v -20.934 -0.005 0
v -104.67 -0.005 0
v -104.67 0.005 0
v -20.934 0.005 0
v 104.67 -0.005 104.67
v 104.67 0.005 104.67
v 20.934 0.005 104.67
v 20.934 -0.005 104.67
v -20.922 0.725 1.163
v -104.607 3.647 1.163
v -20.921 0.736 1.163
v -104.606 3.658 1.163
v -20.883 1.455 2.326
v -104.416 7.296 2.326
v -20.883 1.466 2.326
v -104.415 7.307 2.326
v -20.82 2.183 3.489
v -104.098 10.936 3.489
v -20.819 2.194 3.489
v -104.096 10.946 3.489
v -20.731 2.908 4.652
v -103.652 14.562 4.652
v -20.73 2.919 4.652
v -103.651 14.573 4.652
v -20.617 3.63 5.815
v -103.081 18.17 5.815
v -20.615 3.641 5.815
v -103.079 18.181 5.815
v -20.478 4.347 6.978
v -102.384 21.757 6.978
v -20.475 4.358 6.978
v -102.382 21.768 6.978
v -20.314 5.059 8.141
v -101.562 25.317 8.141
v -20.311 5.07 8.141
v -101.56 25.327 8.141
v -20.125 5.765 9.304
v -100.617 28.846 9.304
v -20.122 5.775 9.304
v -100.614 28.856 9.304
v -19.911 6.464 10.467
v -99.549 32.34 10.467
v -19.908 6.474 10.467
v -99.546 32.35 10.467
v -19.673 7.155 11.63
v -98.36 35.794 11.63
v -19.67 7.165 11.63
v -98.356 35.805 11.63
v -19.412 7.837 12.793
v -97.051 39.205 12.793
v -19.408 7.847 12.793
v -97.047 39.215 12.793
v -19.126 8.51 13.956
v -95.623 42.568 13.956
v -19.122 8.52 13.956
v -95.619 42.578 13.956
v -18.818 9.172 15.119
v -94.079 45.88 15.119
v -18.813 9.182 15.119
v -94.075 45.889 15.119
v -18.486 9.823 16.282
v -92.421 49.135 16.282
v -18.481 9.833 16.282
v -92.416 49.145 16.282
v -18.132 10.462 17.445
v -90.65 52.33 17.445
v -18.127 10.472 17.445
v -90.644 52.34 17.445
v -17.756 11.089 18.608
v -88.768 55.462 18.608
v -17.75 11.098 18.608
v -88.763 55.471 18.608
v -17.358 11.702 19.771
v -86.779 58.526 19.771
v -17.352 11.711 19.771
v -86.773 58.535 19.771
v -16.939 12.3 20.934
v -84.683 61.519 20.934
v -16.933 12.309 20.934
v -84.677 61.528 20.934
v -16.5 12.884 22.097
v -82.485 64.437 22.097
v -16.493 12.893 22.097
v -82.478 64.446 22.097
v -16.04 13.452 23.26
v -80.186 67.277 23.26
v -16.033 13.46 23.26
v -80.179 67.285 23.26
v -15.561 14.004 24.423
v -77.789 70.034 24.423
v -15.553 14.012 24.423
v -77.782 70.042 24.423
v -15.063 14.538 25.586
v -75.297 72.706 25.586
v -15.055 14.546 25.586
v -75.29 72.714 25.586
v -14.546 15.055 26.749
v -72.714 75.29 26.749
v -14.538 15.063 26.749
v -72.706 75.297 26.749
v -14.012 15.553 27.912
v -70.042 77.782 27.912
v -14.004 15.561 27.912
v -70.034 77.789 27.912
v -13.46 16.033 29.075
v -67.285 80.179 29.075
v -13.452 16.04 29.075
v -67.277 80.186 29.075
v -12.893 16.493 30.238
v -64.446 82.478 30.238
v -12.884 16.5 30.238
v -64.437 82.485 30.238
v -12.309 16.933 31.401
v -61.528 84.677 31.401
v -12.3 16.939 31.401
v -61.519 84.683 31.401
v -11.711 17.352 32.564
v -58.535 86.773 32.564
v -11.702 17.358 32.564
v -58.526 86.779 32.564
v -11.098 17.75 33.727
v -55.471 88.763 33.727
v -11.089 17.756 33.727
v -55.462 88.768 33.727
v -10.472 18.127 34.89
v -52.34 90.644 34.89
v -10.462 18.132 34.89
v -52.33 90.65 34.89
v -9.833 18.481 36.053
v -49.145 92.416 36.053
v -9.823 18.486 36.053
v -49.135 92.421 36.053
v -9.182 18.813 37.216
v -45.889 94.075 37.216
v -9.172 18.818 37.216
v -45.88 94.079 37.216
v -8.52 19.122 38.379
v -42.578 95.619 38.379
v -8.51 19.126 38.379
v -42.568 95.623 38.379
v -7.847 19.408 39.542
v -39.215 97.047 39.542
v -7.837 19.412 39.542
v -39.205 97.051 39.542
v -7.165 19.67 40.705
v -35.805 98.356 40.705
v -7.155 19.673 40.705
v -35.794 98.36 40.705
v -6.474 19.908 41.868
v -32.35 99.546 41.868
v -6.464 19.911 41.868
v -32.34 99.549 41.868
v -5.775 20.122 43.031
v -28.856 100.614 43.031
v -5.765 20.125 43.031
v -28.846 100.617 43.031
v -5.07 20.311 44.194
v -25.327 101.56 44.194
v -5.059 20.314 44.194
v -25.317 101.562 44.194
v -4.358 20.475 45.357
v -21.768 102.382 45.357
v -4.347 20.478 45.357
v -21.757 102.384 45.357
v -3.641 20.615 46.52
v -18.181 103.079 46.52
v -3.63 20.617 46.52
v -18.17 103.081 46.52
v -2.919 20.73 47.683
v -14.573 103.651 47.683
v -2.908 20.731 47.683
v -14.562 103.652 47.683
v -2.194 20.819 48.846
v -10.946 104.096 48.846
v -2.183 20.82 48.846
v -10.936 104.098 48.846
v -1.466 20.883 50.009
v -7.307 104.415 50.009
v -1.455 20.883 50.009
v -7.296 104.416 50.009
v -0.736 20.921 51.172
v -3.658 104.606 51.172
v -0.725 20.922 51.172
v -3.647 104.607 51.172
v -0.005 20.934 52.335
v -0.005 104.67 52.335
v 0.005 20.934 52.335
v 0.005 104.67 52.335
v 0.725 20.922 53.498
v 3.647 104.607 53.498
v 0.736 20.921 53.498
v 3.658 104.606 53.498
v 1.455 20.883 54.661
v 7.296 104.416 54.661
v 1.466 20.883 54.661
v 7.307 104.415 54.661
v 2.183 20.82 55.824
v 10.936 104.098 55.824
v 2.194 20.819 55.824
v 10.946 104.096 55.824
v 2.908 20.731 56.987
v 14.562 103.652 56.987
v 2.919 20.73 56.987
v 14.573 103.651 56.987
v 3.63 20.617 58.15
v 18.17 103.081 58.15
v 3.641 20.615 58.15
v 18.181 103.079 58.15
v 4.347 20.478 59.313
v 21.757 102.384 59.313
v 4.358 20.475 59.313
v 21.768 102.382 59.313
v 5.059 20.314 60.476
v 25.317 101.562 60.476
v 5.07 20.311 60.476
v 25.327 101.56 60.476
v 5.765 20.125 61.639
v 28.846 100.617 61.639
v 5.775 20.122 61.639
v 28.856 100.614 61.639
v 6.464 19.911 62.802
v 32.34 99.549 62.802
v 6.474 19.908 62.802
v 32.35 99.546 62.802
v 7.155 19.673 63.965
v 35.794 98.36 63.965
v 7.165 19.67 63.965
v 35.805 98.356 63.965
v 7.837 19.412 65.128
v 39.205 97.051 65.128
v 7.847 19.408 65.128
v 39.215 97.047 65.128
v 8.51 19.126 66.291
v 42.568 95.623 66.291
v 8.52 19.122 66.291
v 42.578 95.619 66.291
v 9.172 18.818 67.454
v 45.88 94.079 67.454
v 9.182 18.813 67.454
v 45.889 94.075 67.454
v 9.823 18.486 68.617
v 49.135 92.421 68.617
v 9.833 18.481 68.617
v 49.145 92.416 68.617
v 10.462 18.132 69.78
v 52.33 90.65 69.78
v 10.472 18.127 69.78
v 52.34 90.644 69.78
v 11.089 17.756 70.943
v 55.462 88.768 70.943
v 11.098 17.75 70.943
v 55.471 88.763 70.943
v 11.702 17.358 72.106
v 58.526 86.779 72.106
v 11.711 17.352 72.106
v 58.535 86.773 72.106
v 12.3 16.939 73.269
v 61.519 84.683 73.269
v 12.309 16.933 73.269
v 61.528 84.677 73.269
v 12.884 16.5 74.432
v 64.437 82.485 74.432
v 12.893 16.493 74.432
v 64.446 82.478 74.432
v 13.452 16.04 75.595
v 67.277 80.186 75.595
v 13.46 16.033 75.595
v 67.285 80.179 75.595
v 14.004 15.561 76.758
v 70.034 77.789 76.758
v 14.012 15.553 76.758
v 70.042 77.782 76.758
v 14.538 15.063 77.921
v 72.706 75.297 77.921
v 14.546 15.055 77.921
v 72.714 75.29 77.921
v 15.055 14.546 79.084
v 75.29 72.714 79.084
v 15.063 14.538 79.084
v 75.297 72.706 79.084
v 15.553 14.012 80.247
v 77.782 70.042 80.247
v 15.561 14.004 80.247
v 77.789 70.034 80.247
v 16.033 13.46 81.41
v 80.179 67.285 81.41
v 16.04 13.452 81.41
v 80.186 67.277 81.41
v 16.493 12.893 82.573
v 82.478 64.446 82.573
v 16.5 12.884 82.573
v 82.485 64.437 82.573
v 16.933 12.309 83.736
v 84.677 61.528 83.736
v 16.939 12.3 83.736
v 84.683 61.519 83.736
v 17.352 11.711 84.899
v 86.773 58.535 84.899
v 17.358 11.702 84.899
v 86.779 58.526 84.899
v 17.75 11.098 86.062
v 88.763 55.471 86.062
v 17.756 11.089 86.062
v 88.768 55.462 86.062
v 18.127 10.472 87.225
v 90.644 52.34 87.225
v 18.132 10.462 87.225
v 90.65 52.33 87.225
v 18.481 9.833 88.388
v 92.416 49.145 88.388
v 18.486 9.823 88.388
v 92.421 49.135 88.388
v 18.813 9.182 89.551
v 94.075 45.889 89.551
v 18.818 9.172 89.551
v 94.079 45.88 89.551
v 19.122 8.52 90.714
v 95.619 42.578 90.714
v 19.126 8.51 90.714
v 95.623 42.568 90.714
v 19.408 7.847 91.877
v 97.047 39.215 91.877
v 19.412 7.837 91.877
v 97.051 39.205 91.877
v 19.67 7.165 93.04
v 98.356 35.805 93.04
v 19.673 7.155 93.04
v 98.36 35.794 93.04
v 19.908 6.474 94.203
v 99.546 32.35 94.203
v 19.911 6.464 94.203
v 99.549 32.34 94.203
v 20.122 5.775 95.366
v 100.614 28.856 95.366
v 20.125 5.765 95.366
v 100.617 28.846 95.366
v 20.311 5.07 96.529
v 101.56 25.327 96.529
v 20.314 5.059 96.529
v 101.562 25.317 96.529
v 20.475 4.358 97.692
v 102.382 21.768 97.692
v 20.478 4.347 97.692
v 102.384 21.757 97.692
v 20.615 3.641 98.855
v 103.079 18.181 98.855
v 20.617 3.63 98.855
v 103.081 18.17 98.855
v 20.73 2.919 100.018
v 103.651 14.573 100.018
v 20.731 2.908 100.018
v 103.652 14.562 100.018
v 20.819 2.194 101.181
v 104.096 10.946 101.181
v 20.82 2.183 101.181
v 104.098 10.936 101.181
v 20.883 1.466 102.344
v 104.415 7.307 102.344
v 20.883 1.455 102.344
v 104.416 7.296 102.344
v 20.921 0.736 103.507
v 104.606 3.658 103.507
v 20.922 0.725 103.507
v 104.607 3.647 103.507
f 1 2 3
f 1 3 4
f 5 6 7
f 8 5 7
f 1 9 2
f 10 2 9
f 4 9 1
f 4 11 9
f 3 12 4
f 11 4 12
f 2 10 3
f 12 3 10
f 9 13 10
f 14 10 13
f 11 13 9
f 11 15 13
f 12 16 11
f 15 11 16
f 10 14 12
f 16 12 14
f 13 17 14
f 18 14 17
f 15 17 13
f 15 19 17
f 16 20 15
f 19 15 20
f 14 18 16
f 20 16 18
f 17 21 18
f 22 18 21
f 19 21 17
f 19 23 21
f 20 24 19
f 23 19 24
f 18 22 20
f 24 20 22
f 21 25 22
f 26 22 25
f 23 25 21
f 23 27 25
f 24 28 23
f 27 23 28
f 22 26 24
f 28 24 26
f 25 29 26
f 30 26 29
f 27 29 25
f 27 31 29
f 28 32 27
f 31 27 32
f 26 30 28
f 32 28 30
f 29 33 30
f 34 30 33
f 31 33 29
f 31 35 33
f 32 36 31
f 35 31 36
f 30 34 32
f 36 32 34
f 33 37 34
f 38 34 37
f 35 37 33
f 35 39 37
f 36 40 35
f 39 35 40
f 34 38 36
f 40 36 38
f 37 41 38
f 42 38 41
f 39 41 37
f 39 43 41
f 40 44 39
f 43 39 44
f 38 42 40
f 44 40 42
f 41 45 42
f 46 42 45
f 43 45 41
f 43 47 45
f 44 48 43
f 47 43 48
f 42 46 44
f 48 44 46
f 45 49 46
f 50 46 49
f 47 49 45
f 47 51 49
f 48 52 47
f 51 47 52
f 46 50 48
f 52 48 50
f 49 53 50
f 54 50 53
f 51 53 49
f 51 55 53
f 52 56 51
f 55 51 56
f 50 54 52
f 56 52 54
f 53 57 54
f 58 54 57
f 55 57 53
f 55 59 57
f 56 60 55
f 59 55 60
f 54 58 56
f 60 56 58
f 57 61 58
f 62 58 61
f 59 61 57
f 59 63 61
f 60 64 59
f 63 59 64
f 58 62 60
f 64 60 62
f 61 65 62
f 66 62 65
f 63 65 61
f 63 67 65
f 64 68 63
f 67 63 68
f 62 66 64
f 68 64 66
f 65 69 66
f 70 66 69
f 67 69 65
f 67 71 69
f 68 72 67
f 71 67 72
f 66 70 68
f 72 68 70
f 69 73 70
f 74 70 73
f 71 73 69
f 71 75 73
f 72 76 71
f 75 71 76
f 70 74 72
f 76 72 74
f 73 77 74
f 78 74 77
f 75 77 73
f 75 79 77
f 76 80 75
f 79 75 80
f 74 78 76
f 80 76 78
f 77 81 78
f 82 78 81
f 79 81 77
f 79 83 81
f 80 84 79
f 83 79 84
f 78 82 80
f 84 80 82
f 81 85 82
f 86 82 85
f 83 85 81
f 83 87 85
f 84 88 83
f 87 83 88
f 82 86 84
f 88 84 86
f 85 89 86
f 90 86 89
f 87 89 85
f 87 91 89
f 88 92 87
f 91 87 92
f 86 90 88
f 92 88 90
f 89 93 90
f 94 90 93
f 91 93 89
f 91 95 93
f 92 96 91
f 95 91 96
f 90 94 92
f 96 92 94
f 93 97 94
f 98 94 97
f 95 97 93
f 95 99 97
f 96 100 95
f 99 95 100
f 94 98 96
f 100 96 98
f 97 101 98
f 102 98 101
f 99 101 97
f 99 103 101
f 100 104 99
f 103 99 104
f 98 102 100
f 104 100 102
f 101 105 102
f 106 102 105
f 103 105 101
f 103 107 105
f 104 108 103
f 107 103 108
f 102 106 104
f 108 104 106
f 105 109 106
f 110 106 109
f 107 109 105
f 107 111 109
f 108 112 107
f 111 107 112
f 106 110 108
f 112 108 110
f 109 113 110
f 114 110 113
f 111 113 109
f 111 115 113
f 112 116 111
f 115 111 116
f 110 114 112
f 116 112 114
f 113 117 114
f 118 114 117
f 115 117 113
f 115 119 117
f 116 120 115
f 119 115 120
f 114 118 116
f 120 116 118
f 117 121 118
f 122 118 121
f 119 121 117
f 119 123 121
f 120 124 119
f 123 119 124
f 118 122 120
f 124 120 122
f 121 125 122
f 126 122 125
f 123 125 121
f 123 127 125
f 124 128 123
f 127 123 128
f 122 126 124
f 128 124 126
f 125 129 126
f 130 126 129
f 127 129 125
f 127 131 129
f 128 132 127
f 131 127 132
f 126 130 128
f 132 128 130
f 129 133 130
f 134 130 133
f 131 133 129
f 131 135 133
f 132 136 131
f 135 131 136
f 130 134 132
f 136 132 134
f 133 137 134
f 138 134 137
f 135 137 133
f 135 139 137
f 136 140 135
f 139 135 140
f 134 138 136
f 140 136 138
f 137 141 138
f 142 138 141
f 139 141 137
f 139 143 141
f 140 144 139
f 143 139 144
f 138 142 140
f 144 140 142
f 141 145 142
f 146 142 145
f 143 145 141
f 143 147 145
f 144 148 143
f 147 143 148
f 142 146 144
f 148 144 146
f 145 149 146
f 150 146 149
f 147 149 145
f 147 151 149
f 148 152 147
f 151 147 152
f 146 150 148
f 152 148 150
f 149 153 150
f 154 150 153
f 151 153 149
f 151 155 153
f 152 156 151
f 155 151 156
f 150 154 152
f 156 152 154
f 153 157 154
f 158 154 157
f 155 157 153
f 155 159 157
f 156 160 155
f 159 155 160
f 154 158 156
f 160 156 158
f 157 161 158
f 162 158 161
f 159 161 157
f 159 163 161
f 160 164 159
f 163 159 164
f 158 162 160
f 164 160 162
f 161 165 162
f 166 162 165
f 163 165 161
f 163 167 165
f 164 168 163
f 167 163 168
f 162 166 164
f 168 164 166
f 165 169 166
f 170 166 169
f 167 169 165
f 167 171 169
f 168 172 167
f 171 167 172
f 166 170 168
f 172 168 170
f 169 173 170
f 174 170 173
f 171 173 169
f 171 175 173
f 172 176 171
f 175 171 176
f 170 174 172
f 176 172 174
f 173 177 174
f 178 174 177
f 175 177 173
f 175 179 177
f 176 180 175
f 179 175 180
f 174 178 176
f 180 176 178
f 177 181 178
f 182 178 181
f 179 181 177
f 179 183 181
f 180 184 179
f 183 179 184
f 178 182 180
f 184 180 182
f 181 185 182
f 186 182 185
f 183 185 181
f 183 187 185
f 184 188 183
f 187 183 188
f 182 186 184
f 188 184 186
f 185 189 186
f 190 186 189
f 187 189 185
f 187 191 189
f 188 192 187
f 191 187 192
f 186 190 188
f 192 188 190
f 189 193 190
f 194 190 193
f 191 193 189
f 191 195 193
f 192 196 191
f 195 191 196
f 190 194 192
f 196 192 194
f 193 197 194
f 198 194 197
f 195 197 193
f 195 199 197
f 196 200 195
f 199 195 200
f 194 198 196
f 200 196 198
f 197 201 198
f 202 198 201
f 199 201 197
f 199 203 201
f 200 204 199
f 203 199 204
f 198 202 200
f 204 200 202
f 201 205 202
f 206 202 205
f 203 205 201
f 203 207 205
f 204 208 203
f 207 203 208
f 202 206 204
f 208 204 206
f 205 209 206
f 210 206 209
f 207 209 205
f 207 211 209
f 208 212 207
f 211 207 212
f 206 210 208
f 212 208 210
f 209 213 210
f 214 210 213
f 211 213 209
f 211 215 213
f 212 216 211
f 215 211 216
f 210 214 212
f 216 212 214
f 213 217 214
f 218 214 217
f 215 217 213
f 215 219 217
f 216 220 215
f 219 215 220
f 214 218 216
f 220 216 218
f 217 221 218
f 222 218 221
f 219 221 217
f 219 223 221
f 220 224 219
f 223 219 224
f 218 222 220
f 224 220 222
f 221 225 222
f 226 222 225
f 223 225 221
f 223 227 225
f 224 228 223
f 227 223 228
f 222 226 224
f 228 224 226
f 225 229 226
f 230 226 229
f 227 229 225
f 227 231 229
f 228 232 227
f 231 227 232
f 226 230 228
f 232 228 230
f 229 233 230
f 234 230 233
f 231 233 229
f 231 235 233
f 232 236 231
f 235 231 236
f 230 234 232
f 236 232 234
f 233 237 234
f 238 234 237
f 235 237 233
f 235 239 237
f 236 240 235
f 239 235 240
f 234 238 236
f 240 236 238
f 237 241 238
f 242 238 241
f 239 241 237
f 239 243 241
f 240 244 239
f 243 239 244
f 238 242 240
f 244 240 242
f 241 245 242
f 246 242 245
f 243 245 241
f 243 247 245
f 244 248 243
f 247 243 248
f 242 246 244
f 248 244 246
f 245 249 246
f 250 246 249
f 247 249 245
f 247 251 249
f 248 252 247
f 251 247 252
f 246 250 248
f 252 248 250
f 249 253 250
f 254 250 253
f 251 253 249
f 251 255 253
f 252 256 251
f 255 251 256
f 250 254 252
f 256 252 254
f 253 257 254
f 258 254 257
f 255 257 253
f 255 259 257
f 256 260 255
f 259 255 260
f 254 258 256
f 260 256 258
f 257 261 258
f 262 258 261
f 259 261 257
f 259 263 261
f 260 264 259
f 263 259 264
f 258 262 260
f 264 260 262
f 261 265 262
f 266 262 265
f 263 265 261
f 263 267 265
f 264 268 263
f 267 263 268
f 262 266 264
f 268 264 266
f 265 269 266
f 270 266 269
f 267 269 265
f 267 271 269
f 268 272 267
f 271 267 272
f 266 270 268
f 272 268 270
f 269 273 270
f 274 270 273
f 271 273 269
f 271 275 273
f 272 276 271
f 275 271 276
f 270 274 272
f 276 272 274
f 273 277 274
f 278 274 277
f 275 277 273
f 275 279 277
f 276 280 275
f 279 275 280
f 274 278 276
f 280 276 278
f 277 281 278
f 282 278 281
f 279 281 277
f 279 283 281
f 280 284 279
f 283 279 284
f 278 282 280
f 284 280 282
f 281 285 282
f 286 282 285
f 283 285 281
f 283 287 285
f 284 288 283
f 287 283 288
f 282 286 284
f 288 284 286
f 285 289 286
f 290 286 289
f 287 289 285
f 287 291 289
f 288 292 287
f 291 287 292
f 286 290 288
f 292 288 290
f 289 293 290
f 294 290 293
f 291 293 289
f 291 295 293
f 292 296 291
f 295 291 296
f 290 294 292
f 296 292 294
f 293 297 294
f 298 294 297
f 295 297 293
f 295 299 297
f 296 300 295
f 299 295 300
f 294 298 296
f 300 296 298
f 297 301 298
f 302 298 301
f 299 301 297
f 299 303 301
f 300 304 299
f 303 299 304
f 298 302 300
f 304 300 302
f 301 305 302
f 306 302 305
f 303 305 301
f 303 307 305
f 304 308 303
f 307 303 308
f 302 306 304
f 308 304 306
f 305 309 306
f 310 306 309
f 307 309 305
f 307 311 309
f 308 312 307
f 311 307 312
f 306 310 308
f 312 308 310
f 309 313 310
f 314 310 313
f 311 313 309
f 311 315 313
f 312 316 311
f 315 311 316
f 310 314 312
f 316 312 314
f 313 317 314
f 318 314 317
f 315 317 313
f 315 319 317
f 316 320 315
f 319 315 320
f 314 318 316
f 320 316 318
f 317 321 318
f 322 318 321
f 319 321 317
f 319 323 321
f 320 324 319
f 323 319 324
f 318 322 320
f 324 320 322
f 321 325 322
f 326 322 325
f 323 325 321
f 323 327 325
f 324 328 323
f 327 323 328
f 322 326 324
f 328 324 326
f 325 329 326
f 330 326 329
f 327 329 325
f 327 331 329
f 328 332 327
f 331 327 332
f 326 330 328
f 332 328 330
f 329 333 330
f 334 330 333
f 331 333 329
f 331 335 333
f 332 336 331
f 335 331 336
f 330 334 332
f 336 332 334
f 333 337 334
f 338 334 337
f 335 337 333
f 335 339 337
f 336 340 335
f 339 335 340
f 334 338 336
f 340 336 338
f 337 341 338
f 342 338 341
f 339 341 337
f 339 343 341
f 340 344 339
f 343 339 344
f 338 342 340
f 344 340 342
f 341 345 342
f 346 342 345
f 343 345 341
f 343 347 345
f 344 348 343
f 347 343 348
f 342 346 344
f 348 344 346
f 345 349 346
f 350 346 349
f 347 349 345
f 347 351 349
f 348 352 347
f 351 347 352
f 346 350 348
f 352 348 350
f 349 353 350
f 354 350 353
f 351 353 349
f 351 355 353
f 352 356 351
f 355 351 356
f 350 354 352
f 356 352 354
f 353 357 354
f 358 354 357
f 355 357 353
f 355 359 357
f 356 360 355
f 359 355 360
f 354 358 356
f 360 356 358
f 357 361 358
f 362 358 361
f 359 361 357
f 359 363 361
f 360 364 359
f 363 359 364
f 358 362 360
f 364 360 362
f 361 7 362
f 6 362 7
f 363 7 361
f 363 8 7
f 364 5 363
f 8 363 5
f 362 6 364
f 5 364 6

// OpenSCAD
// with twist the extruded shape will rotate around the Z axis
$fn=180;

in2mm = 25.4;
shaftDia = 1.5*in2mm;

scaleFactor = 3/2.73;

//difference()
{
    //hull()
    {
        scale([scaleFactor, scaleFactor, scaleFactor])
            linear_extrude(height = 3.75*in2mm, twist = 180)
            translate([-(3*in2mm/2 + shaftDia/2) , 0, 0])
                square([3*in2mm, .01], center = true);
        /*translate([0, 0, 0])
            linear_extrude(height = .01, twist = 180)
            translate([-(3*in2mm/2 + shaftDia/2) , 0, 0])
                square([3*in2mm, .01], center = true);*/
    }

    //cylinder(d=shaftDia, h=3.75*in2mm);
}
